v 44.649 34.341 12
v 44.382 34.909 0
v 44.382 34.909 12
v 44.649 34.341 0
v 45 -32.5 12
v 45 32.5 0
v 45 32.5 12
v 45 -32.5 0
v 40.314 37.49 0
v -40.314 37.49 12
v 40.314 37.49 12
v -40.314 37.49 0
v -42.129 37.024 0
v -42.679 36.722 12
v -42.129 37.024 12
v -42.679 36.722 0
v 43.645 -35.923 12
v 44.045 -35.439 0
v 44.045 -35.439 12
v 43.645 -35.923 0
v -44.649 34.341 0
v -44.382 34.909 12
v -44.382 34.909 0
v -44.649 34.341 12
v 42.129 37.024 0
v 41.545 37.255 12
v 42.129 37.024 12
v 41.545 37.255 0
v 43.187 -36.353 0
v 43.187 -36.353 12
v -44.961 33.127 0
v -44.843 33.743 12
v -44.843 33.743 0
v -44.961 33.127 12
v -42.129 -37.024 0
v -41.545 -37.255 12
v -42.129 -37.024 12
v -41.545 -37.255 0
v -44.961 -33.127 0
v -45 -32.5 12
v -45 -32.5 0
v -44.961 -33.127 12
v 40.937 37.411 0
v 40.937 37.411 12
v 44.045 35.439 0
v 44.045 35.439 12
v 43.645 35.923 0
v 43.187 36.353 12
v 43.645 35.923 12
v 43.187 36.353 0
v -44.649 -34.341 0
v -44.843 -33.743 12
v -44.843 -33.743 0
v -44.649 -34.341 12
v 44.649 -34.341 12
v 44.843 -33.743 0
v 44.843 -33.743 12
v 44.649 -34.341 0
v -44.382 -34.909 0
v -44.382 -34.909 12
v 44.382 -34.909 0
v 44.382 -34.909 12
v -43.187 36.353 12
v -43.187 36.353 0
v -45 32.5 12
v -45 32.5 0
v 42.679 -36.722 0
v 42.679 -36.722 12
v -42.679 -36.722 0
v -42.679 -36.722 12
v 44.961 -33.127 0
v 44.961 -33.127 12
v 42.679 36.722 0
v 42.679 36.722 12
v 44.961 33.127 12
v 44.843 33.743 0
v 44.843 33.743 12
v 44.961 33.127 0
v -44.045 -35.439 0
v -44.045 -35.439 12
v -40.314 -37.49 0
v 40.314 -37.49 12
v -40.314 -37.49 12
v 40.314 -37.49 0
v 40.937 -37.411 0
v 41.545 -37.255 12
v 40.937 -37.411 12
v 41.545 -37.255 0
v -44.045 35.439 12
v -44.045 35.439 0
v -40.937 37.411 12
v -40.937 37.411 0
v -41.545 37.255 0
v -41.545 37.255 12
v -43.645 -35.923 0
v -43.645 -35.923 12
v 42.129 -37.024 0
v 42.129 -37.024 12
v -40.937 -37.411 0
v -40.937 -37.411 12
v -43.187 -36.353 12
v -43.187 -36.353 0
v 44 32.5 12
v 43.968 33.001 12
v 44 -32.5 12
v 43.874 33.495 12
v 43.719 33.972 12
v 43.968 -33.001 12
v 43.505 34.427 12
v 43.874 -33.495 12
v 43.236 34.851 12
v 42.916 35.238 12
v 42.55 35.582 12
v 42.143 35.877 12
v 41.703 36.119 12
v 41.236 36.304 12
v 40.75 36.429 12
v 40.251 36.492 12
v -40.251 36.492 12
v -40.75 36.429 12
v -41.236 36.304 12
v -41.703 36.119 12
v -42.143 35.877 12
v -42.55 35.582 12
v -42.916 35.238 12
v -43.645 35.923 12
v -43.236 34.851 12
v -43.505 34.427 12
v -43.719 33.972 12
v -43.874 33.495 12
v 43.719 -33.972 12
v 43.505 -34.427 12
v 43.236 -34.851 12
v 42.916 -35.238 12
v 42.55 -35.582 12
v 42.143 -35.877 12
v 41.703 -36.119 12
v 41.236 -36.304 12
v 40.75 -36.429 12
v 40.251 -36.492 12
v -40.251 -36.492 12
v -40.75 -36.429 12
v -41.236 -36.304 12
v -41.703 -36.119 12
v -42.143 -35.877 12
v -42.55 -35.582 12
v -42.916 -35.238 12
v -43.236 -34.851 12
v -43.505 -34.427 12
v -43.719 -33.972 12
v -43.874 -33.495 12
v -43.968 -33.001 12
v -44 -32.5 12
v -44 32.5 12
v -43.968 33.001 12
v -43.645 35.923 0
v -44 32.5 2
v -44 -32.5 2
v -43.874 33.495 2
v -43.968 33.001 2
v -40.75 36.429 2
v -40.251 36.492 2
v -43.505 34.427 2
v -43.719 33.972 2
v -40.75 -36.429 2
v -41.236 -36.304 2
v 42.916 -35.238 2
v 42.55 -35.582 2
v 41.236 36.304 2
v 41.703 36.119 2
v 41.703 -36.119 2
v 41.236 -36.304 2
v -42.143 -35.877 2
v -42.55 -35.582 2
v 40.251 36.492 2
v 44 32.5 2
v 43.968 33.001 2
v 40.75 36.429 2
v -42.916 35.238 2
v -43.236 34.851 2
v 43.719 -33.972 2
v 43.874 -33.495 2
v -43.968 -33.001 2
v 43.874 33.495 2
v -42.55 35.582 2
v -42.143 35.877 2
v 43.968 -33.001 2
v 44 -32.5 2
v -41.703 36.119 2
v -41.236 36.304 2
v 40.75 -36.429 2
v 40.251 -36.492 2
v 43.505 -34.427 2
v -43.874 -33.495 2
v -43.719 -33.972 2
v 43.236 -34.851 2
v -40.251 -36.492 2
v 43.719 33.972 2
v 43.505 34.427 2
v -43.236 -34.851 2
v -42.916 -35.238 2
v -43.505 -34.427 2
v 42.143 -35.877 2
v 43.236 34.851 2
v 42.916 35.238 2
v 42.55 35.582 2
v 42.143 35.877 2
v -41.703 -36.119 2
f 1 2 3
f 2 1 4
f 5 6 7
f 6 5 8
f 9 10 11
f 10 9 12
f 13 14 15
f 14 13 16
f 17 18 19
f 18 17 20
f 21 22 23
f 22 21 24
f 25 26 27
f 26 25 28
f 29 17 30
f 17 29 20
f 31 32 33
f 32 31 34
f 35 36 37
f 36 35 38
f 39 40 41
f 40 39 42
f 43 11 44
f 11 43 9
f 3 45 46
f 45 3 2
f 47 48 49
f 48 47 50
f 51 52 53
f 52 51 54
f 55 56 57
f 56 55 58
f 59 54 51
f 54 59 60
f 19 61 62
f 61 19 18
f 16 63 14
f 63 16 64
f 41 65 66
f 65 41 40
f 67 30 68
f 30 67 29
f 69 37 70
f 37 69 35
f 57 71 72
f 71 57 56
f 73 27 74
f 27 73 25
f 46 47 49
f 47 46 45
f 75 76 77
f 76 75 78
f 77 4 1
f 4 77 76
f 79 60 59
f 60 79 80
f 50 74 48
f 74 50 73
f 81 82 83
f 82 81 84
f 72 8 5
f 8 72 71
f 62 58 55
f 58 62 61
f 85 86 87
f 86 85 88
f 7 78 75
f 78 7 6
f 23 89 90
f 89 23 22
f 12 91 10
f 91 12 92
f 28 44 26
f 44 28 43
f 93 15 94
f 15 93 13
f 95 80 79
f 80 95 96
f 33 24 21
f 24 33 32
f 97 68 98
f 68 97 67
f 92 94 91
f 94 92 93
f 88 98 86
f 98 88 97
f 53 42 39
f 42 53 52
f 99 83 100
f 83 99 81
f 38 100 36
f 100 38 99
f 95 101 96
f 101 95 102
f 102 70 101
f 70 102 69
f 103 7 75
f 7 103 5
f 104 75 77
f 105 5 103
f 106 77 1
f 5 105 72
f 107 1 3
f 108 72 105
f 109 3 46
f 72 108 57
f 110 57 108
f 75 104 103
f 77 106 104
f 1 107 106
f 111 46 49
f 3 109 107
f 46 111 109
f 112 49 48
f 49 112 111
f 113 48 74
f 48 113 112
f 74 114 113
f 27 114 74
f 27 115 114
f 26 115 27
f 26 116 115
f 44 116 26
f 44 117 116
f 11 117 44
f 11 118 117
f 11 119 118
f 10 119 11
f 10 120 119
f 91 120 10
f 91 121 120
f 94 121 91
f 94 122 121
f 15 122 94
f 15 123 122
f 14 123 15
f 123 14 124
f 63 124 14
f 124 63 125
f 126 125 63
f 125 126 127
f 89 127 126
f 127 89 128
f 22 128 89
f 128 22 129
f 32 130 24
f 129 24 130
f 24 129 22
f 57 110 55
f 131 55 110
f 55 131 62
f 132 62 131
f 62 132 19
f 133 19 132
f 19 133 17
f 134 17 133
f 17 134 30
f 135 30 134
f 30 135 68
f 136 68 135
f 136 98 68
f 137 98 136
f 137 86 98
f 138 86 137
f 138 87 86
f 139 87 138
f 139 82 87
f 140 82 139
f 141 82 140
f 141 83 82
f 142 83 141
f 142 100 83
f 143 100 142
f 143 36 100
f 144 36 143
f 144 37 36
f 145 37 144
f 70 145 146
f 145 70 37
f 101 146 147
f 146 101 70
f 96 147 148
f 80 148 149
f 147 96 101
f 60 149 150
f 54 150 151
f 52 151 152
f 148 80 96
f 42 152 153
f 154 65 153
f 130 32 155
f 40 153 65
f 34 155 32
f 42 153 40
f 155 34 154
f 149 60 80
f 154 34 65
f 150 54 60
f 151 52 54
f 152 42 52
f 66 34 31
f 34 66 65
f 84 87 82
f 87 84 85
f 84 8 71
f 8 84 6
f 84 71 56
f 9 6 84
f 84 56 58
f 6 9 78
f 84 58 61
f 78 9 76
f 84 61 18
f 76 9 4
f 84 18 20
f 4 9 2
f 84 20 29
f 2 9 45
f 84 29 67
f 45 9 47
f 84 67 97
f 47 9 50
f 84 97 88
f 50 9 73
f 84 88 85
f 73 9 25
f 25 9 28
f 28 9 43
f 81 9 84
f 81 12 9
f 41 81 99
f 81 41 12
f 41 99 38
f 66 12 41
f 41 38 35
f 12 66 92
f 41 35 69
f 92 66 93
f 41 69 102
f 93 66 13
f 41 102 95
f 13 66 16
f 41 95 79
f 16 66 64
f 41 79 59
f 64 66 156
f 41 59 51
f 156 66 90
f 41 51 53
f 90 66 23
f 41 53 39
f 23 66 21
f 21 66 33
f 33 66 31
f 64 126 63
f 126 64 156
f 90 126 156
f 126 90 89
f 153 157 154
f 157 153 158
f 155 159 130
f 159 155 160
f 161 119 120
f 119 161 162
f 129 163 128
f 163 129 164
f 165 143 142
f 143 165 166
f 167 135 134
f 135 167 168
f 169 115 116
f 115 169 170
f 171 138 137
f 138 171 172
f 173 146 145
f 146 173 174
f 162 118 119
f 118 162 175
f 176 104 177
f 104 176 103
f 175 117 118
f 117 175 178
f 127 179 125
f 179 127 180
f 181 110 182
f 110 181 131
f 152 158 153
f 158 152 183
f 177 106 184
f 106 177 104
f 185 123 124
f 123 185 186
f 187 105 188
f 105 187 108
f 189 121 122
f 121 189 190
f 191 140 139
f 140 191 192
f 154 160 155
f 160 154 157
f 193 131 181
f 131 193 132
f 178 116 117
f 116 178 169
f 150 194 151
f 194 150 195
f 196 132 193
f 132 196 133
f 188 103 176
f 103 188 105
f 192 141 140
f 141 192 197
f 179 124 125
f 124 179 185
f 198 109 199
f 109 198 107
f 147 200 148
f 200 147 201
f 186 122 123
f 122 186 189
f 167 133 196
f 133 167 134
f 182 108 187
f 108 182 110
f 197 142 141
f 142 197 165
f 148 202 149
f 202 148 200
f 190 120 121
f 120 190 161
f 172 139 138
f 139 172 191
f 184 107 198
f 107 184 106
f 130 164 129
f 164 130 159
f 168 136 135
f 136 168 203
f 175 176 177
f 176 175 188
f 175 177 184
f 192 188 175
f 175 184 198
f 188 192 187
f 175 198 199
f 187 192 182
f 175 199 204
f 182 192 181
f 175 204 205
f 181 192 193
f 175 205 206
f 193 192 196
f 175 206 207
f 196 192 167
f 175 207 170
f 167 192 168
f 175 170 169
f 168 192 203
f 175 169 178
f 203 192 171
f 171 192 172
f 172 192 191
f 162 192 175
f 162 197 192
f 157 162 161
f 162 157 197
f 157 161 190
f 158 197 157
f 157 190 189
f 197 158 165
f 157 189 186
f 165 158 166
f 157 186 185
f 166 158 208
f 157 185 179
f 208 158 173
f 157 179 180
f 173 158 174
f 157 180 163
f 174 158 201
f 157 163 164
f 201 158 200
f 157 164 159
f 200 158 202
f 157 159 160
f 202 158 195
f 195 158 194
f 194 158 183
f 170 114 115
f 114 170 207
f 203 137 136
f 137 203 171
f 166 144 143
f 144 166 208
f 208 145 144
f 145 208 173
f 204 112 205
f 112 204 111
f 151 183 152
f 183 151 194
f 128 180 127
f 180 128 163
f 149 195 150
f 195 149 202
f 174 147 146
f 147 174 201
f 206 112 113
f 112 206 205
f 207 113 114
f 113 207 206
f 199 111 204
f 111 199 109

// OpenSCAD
$fn = 50;


difference() {
	union() {
		hull() {
			translate(v = [-40.0000000000, 32.5000000000, 0]) {
				cylinder(h = 12, r = 5);
			}
			translate(v = [40.0000000000, 32.5000000000, 0]) {
				cylinder(h = 12, r = 5);
			}
			translate(v = [-40.0000000000, -32.5000000000, 0]) {
				cylinder(h = 12, r = 5);
			}
			translate(v = [40.0000000000, -32.5000000000, 0]) {
				cylinder(h = 12, r = 5);
			}
		}
	}
	union() {
		translate(v = [0, 0, 2]) {
			hull() {
				translate(v = [-40.0000000000, 32.5000000000, 0]) {
					cylinder(h = 10, r = 4);
				}
				translate(v = [40.0000000000, 32.5000000000, 0]) {
					cylinder(h = 10, r = 4);
				}
				translate(v = [-40.0000000000, -32.5000000000, 0]) {
					cylinder(h = 10, r = 4);
				}
				translate(v = [40.0000000000, -32.5000000000, 0]) {
					cylinder(h = 10, r = 4);
				}
			}
		}
	}
}
